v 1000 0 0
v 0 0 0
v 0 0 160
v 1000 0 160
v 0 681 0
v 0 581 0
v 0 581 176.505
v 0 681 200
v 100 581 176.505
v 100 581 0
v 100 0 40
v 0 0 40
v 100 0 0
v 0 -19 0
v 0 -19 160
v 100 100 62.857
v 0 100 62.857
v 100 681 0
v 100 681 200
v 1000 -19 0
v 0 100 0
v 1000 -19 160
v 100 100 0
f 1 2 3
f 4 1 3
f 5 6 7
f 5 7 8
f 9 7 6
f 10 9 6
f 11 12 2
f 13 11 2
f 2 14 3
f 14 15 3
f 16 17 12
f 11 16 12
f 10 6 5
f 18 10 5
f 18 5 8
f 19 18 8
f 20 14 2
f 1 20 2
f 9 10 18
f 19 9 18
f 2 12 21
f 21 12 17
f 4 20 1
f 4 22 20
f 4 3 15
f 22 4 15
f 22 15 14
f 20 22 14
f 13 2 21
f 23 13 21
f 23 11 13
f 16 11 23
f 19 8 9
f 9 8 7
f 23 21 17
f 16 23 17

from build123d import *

# Parameters (mm, degrees)
F1_DEPTH = 100
F2_DEPTH = 100
F3_DEPTH = 1000


with BuildPart() as f1:
    # F0 (on Right) → F1 (new body)
    with BuildSketch(Plane.YZ):
        Polygon((681, 200), (581, 176.50514), (581, 0), (681, 0), align=None)
    extrude(amount=F1_DEPTH)


with BuildPart() as f2:
    # F0 (on Right) → F2 (new body)
    with BuildSketch(Plane.YZ):
        Polygon((0, 40), (0, 0), (100, 0), (100, 62.857143), align=None)
    extrude(amount=F2_DEPTH)


with BuildPart() as f3:
    # F0 (on Right) → F3 (new body)
    with BuildSketch(Plane.YZ):
        Polygon((-19, 0), (0, 0), (0, 40), (0, 59.517009), (0, 160), (-19, 160), align=None)
    extrude(amount=F3_DEPTH)


solid = Compound([f1.part, f2.part, f3.part])
